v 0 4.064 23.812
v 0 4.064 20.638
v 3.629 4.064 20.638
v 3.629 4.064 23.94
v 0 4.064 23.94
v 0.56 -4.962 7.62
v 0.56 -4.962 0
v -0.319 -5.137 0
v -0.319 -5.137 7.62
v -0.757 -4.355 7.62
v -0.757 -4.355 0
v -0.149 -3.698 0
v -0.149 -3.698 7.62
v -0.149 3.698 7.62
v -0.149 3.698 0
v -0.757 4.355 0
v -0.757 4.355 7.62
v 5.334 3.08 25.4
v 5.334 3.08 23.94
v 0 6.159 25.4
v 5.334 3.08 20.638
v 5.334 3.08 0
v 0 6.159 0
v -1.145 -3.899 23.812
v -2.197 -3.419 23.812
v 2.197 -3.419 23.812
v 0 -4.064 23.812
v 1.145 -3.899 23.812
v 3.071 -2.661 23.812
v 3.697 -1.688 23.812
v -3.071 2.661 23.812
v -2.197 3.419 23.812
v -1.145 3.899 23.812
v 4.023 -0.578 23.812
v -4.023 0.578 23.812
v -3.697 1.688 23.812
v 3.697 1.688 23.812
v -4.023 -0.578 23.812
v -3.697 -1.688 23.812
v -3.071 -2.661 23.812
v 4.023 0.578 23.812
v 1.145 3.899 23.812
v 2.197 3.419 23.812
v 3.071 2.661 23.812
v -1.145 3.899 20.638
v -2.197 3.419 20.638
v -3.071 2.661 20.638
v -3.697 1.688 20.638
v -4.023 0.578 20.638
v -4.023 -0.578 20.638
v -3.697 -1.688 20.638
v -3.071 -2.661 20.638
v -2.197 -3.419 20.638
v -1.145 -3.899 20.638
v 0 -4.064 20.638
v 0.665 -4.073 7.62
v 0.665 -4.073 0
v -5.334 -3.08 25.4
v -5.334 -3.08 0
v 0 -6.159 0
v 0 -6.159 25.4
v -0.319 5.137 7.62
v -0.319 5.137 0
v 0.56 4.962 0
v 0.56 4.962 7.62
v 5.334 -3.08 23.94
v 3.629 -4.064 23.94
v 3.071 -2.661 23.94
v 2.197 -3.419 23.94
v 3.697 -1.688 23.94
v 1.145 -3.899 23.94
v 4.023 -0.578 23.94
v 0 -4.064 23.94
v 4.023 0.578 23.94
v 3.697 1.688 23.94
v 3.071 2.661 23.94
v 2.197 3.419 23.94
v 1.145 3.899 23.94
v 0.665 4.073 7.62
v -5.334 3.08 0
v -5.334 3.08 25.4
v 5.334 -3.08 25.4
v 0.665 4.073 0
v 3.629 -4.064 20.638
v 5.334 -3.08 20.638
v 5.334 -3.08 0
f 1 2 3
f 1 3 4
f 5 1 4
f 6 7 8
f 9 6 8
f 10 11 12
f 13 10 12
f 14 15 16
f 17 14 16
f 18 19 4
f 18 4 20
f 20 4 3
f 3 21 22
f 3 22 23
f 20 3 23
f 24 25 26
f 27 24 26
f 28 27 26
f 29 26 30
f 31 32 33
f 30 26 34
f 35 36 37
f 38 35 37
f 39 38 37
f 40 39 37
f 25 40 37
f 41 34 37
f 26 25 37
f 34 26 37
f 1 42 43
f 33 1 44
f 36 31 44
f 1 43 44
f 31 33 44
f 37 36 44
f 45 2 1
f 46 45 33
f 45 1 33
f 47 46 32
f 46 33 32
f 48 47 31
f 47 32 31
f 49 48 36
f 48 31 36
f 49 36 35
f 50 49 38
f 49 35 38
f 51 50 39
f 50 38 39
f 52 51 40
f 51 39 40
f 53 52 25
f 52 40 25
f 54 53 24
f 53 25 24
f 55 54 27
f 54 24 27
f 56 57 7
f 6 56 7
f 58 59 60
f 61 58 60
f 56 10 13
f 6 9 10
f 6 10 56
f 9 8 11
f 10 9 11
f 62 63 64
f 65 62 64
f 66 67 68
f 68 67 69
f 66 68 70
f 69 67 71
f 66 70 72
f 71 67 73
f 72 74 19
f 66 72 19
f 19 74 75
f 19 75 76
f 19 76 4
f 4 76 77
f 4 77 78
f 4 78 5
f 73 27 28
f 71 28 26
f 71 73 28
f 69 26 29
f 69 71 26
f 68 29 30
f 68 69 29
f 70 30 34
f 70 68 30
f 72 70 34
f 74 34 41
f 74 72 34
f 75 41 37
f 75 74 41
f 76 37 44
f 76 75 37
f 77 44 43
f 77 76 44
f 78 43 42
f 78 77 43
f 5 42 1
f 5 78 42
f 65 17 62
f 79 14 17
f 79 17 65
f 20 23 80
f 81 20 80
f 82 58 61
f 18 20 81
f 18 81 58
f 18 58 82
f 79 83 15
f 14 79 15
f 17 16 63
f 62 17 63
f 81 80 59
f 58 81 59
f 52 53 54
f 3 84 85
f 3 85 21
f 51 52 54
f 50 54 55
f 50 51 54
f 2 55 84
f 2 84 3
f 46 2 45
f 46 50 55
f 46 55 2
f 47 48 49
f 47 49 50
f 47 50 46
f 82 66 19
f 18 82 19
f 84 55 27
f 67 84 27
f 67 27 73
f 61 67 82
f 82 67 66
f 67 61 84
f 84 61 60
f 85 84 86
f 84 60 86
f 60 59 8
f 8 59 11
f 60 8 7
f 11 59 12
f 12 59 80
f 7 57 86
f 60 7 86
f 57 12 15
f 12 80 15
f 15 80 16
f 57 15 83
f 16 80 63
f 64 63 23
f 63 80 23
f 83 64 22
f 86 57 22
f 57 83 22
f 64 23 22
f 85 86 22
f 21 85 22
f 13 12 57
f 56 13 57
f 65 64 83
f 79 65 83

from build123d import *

# Parameters (mm, degrees)
F1_DEPTH = 25.4
F2_R     = 4.064
F3_DEPTH = 4.7625
F4_W     = 8.128
F4_H     = 3.302
F5_DEPTH = 5.335
F6_R     = 4.064
F7_DEPTH = 1.5875
F9_DEPTH = 7.62


with BuildPart() as f1:
    # F0 (on Top) → F1 (new body)
    with BuildSketch(Plane.XY):
        Polygon((5.334, -3.079586), (5.334, 3.079586), (0, 6.159173), (-5.334, 3.079586), (-5.334, -3.079586), (0, -6.159173), align=None)
    extrude(amount=F1_DEPTH)

    # F2 (on face) → F3 (cut)
    with BuildSketch(Plane.XY.offset(25.4)):
        Circle(F2_R)
    extrude(amount=-F3_DEPTH, mode=Mode.SUBTRACT)

    # F4 (on Right) → F5 (cut, through all)
    with BuildSketch(Plane.YZ):
        with Locations((0, 22.2885)):
            Rectangle(F4_W, F4_H)
    extrude(amount=F5_DEPTH, mode=Mode.SUBTRACT)

    # F6 (on face) → F7 (join)
    with BuildSketch(Plane.XY.offset(25.4)):
        Circle(F6_R)
    extrude(amount=-F7_DEPTH)

    # F8 (on face) → F9 (cut)
    with BuildSketch(Plane(origin=(0, 0, 0), x_dir=(1, 0, 0), z_dir=(0, 0, -1))):
        Polygon((0.559566, -4.962233), (0.664833, -4.072655), (-0.148677, -3.697645), (-0.75672, -4.355455), (-0.319002, -5.137013), align=None)
        Polygon((-0.148677, 3.697645), (0.664833, 4.072655), (0.559566, 4.962233), (-0.319002, 5.137013), (-0.75672, 4.355455), align=None)
    extrude(amount=-F9_DEPTH, mode=Mode.SUBTRACT)


solid = f1.part
